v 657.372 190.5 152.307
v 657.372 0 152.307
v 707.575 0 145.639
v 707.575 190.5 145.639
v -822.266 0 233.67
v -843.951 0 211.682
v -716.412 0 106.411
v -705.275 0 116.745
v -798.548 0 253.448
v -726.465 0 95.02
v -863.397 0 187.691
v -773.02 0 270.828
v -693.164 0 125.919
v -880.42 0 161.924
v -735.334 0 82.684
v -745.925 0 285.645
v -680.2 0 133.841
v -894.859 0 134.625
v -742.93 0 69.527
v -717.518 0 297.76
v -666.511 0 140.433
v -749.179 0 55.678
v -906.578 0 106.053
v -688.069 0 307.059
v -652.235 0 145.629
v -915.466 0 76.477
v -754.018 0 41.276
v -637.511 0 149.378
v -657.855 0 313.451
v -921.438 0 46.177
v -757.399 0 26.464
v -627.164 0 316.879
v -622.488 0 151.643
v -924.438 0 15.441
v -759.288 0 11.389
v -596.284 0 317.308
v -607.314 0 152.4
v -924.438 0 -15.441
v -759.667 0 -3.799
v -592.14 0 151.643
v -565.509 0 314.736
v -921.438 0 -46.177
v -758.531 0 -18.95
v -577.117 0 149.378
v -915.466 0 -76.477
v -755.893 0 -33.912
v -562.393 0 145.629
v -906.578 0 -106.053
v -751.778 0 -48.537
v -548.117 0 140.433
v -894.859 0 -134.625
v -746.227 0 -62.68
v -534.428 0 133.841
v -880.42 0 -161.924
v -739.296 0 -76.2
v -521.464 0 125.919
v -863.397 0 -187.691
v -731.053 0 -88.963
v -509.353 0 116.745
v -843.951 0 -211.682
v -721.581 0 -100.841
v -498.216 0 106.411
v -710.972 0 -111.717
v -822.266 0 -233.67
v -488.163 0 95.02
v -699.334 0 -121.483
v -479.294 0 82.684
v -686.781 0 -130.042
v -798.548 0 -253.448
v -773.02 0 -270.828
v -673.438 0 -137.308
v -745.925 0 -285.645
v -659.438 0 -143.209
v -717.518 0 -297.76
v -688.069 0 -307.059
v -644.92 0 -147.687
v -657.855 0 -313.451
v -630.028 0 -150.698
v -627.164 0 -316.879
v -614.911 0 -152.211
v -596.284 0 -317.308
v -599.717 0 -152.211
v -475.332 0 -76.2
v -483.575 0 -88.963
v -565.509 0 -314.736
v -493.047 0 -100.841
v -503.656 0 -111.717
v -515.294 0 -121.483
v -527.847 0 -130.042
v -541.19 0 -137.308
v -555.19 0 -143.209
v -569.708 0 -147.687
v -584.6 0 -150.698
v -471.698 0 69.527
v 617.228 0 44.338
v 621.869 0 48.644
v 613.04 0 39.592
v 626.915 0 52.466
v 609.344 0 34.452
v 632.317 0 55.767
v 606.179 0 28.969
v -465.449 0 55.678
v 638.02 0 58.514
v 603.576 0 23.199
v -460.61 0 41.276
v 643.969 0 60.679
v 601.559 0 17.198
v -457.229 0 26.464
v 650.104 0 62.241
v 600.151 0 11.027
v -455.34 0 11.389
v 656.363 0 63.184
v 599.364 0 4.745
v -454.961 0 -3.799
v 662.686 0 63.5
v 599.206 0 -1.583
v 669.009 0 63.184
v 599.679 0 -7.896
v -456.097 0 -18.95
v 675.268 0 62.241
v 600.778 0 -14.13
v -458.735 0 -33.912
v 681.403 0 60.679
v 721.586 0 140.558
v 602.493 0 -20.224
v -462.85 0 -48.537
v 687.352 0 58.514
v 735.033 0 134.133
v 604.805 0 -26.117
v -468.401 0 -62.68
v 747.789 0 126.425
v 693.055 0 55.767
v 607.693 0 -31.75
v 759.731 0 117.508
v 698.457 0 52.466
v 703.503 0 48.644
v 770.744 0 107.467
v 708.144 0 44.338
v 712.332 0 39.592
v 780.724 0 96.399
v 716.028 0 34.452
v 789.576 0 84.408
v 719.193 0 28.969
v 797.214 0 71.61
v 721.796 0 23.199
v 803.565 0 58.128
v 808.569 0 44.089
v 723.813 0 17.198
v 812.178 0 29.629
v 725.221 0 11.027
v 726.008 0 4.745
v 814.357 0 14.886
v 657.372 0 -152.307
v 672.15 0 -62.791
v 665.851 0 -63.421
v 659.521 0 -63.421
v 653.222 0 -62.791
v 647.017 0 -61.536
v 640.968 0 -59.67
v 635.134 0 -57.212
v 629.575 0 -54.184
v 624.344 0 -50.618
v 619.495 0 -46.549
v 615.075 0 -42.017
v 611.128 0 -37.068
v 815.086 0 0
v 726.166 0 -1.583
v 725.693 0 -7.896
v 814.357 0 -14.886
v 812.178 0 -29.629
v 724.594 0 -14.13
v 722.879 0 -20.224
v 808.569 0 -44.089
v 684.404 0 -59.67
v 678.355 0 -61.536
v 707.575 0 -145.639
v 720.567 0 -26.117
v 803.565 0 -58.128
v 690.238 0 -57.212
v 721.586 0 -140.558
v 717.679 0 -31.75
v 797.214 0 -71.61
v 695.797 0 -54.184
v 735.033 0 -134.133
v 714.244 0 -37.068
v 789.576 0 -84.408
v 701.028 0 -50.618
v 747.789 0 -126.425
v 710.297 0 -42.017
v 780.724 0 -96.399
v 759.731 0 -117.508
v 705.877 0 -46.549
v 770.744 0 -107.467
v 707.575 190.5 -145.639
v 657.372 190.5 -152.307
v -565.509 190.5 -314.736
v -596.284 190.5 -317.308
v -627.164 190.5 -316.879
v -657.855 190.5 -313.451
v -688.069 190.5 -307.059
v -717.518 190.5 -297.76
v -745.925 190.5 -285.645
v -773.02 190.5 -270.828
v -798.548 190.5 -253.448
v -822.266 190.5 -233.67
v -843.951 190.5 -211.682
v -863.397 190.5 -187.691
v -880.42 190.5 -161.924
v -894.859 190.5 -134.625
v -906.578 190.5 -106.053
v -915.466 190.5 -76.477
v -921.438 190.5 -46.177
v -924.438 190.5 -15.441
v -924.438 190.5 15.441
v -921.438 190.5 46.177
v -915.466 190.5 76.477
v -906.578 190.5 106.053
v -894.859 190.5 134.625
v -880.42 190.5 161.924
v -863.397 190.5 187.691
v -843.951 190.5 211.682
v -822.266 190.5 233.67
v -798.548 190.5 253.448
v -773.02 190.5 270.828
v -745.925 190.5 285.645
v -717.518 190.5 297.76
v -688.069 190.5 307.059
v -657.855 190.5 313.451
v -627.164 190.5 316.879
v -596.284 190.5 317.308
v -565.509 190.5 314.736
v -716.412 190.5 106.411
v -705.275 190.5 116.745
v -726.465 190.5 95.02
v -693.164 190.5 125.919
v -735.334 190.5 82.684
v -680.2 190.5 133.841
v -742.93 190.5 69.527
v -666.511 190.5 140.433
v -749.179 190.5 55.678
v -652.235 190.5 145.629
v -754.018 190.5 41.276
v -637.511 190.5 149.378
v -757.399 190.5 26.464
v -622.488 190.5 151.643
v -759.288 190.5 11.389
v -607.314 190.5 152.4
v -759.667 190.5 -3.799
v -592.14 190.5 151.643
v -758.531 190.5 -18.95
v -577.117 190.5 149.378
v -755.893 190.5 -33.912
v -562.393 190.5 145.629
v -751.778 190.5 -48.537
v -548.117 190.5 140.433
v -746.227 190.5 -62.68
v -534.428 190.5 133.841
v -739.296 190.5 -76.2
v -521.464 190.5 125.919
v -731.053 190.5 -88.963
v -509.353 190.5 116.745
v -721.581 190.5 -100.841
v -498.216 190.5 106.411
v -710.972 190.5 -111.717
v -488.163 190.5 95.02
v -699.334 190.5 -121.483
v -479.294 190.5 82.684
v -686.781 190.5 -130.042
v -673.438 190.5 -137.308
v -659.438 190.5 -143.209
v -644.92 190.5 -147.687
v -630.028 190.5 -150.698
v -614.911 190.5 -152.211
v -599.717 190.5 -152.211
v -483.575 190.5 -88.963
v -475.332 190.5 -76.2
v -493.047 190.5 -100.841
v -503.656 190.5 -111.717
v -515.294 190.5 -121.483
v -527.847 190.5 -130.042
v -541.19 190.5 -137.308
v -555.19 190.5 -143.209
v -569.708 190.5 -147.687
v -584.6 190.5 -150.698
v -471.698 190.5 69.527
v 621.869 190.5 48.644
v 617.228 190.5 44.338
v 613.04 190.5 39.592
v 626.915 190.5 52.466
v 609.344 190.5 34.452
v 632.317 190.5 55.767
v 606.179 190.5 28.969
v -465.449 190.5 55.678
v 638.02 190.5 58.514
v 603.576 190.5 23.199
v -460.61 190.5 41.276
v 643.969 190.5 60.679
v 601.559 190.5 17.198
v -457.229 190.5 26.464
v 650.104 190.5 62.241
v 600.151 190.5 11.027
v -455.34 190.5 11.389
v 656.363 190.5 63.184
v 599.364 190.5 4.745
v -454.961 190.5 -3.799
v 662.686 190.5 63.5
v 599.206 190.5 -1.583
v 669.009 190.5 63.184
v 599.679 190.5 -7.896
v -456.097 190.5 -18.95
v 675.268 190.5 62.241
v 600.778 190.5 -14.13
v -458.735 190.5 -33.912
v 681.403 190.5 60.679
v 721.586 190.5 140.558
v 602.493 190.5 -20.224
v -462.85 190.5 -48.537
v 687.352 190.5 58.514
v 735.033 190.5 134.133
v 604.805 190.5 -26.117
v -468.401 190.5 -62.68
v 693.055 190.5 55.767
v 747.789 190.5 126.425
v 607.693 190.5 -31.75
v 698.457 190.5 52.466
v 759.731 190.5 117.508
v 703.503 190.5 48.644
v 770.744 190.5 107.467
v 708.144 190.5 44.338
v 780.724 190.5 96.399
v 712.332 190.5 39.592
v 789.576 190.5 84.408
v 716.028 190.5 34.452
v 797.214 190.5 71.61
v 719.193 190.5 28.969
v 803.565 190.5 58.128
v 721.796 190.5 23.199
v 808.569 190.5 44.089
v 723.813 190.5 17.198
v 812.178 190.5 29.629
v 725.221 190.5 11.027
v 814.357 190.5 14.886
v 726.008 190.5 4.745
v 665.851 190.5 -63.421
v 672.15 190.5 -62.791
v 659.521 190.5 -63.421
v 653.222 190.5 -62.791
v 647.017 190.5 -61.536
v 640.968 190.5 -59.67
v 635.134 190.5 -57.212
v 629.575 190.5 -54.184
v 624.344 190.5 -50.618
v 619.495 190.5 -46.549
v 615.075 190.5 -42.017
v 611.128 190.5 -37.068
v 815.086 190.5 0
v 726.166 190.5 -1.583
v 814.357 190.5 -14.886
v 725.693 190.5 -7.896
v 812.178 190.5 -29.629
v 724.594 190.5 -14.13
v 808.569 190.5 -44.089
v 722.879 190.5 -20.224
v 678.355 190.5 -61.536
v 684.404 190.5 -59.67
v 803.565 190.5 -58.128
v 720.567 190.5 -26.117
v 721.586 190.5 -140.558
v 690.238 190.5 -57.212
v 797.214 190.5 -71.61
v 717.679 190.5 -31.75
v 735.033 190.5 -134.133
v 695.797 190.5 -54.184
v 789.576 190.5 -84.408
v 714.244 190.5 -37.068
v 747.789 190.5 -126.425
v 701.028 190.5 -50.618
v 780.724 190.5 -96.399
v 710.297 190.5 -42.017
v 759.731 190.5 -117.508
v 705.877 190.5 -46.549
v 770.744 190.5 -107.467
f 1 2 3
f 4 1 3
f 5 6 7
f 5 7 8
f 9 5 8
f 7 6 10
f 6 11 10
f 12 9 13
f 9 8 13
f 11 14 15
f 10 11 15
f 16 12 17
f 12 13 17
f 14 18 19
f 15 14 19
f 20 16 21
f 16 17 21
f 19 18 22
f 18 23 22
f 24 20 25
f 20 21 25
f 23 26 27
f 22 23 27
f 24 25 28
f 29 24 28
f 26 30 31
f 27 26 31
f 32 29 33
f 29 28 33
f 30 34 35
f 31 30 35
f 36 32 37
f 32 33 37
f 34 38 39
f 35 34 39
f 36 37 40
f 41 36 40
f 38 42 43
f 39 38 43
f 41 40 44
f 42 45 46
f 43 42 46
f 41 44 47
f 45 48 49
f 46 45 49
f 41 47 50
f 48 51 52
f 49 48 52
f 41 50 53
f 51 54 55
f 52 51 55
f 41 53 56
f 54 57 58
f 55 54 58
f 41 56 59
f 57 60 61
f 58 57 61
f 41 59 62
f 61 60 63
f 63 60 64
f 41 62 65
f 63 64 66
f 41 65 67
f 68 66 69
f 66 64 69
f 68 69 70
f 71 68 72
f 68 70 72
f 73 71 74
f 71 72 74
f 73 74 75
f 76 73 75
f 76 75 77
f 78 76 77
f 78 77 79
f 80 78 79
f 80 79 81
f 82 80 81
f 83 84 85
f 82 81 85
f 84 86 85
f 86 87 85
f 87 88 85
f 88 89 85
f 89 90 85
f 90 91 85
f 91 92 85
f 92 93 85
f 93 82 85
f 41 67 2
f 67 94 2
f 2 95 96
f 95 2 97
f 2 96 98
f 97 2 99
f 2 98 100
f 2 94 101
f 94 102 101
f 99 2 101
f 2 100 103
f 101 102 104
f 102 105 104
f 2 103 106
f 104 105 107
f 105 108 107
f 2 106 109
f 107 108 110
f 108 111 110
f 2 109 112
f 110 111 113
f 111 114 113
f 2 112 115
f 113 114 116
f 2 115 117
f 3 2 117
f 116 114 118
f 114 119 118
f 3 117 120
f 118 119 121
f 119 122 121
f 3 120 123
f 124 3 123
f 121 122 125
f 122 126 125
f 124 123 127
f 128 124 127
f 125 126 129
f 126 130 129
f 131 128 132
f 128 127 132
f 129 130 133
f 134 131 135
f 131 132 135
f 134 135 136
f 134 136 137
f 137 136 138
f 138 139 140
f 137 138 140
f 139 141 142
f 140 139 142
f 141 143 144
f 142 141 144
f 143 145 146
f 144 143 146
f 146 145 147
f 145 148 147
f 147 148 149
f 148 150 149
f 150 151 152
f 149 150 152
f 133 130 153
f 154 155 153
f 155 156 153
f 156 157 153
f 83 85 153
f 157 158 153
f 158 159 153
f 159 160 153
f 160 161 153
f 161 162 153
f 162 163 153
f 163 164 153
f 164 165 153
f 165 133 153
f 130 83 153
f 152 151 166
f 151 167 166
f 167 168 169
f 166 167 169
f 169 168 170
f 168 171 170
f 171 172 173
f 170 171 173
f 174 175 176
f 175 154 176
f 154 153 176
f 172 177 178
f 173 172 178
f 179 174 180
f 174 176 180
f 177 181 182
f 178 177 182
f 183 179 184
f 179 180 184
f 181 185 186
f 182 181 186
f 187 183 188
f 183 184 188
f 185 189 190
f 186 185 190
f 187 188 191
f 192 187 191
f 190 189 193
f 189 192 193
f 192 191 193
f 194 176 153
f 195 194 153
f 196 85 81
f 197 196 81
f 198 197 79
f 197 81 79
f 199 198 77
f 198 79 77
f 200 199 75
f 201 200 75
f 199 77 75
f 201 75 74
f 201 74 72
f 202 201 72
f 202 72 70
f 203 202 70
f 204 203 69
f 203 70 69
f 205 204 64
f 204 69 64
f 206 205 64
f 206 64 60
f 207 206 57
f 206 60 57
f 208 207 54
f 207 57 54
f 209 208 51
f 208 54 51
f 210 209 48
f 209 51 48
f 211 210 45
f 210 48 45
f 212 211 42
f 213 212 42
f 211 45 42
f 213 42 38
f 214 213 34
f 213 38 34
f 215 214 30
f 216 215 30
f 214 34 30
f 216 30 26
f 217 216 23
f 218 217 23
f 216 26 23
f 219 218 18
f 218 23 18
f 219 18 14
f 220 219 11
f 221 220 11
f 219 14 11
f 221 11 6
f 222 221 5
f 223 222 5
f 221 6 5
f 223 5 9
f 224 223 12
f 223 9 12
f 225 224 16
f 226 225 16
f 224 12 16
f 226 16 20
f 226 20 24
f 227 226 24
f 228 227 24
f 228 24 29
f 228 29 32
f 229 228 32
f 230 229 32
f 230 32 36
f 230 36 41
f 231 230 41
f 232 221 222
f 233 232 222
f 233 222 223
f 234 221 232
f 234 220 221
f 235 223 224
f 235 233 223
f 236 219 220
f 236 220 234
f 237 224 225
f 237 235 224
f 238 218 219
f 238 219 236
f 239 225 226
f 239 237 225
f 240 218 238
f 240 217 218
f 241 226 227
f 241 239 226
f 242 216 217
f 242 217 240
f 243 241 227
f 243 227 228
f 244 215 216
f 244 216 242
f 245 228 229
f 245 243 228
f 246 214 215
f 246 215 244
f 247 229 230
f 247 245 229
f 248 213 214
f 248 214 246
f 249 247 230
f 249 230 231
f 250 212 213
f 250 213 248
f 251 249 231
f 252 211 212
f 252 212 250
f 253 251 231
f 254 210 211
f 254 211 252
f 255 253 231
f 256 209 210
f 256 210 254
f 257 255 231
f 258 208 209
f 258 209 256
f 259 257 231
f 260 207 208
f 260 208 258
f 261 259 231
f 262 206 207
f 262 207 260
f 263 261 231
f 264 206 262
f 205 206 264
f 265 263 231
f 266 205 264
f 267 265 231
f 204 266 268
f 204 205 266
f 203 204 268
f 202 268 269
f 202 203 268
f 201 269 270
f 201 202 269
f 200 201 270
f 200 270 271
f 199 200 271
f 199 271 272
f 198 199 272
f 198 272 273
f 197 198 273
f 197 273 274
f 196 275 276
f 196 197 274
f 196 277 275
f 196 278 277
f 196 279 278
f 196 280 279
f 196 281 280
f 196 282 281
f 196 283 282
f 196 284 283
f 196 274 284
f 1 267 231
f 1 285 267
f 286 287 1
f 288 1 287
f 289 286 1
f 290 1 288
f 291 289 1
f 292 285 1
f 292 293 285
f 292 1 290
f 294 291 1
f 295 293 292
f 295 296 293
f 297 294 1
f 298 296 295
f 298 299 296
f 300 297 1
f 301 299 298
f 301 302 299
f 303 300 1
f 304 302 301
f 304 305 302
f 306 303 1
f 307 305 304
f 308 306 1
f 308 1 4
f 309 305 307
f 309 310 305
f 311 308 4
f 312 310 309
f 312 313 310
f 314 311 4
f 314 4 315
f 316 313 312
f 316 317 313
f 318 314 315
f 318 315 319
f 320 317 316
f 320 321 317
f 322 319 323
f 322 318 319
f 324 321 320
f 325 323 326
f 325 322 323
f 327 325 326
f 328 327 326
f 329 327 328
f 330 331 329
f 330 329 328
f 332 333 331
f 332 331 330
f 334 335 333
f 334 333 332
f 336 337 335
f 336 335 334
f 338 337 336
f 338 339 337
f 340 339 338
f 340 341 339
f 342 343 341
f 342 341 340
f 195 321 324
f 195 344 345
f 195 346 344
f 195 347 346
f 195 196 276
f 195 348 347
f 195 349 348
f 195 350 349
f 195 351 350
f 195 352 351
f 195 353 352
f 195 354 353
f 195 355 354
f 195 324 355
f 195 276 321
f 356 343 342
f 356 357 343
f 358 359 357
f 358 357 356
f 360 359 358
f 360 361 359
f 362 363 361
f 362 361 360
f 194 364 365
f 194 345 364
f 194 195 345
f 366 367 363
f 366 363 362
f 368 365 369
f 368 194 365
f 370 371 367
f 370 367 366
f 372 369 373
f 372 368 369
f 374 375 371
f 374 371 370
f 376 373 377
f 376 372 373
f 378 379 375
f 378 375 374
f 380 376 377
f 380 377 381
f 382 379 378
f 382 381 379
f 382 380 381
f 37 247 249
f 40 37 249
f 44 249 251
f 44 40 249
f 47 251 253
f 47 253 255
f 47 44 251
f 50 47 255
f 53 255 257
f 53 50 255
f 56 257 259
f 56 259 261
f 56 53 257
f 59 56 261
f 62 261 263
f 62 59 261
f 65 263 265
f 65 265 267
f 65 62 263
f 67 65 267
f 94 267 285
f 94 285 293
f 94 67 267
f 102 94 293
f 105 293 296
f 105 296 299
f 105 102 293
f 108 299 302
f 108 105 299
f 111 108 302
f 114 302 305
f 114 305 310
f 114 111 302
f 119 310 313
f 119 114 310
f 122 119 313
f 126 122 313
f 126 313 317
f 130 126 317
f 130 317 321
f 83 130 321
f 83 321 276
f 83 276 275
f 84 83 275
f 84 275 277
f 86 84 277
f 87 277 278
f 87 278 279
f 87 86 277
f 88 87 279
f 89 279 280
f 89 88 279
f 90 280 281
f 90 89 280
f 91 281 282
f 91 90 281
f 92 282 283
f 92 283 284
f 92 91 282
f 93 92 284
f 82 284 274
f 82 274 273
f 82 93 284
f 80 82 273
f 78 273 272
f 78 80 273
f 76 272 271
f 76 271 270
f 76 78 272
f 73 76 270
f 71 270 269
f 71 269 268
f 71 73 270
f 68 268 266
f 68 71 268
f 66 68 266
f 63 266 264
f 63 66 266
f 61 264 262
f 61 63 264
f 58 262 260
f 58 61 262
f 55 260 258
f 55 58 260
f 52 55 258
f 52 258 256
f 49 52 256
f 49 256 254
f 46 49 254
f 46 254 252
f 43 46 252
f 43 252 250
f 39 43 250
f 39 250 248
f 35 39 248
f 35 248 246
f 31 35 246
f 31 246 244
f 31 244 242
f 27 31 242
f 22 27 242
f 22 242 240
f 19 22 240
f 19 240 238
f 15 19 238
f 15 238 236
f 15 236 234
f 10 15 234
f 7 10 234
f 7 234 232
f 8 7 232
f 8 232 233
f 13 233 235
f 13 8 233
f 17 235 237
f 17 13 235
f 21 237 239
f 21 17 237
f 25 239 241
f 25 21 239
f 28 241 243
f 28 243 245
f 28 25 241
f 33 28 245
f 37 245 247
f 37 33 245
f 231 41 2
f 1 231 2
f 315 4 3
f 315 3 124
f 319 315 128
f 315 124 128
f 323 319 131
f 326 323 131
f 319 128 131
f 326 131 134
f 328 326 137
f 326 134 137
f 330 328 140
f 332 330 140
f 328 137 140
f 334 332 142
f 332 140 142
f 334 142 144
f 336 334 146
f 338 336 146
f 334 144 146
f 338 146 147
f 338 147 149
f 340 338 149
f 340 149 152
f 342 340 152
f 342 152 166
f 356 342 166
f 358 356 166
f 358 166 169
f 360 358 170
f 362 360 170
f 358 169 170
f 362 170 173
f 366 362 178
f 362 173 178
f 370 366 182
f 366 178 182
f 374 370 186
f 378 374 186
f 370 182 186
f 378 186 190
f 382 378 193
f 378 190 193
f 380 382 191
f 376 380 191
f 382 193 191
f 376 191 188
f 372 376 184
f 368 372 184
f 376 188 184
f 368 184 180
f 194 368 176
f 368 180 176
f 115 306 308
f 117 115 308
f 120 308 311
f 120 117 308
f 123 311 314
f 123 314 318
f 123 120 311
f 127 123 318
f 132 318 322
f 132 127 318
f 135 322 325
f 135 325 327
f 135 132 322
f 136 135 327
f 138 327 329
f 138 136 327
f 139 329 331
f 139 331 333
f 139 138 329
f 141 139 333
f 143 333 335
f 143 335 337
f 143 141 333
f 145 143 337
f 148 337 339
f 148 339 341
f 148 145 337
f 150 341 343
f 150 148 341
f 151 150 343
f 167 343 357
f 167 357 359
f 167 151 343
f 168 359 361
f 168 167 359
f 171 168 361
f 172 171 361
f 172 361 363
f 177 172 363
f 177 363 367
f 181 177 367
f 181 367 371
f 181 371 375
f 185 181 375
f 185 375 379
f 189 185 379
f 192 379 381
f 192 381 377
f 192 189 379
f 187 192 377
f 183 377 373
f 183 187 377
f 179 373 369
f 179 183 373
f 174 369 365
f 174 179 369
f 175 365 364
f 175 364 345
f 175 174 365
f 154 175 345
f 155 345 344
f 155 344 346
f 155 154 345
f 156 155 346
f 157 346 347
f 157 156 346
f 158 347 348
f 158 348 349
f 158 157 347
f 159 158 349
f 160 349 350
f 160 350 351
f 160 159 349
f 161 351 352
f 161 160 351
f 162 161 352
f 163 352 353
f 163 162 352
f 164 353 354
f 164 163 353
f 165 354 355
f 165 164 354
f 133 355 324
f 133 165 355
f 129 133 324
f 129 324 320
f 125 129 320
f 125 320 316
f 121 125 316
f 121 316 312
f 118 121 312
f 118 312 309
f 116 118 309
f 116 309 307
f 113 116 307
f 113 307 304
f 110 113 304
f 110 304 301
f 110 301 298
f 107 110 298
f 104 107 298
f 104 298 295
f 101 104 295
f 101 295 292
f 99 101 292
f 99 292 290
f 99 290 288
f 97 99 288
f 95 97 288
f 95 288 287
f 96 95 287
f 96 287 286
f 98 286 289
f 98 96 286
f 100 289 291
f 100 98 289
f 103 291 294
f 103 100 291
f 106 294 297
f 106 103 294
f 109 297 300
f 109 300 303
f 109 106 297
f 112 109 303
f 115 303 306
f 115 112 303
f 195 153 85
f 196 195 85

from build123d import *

# Parameters (mm, degrees)
SKETCH1_R           = 152.4
SKETCH1_R_2         = 63.5
BOSS_EXTRUDE1_DEPTH = 190.5


with BuildPart() as part:
    # Sketch1 → Boss-Extrude1 (new body)
    with BuildSketch(Plane(origin=(0, 0, 0), x_dir=(1, 0, 0), z_dir=(0, 1, 0))):
        with BuildLine():
            Line((657.371733042, 152.307316196), (-565.509397264, 314.735802206))
            ThreePointArc((-565.509397264, 314.735802206), (-924.814, 0), (-565.509397264, -314.735802206))
            Line((-565.509397264, -314.735802206), (657.371733042, -152.307316196))
            Line((657.371733042, -152.307316196), (707.57483155, -145.639118379))
            ThreePointArc((707.57483155, -145.639118379), (815.086, 0), (707.57483155, 145.639118379))
            Line((707.57483155, 145.639118379), (657.371733042, 152.307316196))
        make_face()
        with Locations(Location((-607.314, 0, 0), (0, 0, 270))):
            Circle(SKETCH1_R, mode=Mode.SUBTRACT)
        with Locations(Location((662.686, 0, 0), (0, 0, 270))):
            Circle(SKETCH1_R_2, mode=Mode.SUBTRACT)
    extrude(amount=BOSS_EXTRUDE1_DEPTH)


solid = part.part
